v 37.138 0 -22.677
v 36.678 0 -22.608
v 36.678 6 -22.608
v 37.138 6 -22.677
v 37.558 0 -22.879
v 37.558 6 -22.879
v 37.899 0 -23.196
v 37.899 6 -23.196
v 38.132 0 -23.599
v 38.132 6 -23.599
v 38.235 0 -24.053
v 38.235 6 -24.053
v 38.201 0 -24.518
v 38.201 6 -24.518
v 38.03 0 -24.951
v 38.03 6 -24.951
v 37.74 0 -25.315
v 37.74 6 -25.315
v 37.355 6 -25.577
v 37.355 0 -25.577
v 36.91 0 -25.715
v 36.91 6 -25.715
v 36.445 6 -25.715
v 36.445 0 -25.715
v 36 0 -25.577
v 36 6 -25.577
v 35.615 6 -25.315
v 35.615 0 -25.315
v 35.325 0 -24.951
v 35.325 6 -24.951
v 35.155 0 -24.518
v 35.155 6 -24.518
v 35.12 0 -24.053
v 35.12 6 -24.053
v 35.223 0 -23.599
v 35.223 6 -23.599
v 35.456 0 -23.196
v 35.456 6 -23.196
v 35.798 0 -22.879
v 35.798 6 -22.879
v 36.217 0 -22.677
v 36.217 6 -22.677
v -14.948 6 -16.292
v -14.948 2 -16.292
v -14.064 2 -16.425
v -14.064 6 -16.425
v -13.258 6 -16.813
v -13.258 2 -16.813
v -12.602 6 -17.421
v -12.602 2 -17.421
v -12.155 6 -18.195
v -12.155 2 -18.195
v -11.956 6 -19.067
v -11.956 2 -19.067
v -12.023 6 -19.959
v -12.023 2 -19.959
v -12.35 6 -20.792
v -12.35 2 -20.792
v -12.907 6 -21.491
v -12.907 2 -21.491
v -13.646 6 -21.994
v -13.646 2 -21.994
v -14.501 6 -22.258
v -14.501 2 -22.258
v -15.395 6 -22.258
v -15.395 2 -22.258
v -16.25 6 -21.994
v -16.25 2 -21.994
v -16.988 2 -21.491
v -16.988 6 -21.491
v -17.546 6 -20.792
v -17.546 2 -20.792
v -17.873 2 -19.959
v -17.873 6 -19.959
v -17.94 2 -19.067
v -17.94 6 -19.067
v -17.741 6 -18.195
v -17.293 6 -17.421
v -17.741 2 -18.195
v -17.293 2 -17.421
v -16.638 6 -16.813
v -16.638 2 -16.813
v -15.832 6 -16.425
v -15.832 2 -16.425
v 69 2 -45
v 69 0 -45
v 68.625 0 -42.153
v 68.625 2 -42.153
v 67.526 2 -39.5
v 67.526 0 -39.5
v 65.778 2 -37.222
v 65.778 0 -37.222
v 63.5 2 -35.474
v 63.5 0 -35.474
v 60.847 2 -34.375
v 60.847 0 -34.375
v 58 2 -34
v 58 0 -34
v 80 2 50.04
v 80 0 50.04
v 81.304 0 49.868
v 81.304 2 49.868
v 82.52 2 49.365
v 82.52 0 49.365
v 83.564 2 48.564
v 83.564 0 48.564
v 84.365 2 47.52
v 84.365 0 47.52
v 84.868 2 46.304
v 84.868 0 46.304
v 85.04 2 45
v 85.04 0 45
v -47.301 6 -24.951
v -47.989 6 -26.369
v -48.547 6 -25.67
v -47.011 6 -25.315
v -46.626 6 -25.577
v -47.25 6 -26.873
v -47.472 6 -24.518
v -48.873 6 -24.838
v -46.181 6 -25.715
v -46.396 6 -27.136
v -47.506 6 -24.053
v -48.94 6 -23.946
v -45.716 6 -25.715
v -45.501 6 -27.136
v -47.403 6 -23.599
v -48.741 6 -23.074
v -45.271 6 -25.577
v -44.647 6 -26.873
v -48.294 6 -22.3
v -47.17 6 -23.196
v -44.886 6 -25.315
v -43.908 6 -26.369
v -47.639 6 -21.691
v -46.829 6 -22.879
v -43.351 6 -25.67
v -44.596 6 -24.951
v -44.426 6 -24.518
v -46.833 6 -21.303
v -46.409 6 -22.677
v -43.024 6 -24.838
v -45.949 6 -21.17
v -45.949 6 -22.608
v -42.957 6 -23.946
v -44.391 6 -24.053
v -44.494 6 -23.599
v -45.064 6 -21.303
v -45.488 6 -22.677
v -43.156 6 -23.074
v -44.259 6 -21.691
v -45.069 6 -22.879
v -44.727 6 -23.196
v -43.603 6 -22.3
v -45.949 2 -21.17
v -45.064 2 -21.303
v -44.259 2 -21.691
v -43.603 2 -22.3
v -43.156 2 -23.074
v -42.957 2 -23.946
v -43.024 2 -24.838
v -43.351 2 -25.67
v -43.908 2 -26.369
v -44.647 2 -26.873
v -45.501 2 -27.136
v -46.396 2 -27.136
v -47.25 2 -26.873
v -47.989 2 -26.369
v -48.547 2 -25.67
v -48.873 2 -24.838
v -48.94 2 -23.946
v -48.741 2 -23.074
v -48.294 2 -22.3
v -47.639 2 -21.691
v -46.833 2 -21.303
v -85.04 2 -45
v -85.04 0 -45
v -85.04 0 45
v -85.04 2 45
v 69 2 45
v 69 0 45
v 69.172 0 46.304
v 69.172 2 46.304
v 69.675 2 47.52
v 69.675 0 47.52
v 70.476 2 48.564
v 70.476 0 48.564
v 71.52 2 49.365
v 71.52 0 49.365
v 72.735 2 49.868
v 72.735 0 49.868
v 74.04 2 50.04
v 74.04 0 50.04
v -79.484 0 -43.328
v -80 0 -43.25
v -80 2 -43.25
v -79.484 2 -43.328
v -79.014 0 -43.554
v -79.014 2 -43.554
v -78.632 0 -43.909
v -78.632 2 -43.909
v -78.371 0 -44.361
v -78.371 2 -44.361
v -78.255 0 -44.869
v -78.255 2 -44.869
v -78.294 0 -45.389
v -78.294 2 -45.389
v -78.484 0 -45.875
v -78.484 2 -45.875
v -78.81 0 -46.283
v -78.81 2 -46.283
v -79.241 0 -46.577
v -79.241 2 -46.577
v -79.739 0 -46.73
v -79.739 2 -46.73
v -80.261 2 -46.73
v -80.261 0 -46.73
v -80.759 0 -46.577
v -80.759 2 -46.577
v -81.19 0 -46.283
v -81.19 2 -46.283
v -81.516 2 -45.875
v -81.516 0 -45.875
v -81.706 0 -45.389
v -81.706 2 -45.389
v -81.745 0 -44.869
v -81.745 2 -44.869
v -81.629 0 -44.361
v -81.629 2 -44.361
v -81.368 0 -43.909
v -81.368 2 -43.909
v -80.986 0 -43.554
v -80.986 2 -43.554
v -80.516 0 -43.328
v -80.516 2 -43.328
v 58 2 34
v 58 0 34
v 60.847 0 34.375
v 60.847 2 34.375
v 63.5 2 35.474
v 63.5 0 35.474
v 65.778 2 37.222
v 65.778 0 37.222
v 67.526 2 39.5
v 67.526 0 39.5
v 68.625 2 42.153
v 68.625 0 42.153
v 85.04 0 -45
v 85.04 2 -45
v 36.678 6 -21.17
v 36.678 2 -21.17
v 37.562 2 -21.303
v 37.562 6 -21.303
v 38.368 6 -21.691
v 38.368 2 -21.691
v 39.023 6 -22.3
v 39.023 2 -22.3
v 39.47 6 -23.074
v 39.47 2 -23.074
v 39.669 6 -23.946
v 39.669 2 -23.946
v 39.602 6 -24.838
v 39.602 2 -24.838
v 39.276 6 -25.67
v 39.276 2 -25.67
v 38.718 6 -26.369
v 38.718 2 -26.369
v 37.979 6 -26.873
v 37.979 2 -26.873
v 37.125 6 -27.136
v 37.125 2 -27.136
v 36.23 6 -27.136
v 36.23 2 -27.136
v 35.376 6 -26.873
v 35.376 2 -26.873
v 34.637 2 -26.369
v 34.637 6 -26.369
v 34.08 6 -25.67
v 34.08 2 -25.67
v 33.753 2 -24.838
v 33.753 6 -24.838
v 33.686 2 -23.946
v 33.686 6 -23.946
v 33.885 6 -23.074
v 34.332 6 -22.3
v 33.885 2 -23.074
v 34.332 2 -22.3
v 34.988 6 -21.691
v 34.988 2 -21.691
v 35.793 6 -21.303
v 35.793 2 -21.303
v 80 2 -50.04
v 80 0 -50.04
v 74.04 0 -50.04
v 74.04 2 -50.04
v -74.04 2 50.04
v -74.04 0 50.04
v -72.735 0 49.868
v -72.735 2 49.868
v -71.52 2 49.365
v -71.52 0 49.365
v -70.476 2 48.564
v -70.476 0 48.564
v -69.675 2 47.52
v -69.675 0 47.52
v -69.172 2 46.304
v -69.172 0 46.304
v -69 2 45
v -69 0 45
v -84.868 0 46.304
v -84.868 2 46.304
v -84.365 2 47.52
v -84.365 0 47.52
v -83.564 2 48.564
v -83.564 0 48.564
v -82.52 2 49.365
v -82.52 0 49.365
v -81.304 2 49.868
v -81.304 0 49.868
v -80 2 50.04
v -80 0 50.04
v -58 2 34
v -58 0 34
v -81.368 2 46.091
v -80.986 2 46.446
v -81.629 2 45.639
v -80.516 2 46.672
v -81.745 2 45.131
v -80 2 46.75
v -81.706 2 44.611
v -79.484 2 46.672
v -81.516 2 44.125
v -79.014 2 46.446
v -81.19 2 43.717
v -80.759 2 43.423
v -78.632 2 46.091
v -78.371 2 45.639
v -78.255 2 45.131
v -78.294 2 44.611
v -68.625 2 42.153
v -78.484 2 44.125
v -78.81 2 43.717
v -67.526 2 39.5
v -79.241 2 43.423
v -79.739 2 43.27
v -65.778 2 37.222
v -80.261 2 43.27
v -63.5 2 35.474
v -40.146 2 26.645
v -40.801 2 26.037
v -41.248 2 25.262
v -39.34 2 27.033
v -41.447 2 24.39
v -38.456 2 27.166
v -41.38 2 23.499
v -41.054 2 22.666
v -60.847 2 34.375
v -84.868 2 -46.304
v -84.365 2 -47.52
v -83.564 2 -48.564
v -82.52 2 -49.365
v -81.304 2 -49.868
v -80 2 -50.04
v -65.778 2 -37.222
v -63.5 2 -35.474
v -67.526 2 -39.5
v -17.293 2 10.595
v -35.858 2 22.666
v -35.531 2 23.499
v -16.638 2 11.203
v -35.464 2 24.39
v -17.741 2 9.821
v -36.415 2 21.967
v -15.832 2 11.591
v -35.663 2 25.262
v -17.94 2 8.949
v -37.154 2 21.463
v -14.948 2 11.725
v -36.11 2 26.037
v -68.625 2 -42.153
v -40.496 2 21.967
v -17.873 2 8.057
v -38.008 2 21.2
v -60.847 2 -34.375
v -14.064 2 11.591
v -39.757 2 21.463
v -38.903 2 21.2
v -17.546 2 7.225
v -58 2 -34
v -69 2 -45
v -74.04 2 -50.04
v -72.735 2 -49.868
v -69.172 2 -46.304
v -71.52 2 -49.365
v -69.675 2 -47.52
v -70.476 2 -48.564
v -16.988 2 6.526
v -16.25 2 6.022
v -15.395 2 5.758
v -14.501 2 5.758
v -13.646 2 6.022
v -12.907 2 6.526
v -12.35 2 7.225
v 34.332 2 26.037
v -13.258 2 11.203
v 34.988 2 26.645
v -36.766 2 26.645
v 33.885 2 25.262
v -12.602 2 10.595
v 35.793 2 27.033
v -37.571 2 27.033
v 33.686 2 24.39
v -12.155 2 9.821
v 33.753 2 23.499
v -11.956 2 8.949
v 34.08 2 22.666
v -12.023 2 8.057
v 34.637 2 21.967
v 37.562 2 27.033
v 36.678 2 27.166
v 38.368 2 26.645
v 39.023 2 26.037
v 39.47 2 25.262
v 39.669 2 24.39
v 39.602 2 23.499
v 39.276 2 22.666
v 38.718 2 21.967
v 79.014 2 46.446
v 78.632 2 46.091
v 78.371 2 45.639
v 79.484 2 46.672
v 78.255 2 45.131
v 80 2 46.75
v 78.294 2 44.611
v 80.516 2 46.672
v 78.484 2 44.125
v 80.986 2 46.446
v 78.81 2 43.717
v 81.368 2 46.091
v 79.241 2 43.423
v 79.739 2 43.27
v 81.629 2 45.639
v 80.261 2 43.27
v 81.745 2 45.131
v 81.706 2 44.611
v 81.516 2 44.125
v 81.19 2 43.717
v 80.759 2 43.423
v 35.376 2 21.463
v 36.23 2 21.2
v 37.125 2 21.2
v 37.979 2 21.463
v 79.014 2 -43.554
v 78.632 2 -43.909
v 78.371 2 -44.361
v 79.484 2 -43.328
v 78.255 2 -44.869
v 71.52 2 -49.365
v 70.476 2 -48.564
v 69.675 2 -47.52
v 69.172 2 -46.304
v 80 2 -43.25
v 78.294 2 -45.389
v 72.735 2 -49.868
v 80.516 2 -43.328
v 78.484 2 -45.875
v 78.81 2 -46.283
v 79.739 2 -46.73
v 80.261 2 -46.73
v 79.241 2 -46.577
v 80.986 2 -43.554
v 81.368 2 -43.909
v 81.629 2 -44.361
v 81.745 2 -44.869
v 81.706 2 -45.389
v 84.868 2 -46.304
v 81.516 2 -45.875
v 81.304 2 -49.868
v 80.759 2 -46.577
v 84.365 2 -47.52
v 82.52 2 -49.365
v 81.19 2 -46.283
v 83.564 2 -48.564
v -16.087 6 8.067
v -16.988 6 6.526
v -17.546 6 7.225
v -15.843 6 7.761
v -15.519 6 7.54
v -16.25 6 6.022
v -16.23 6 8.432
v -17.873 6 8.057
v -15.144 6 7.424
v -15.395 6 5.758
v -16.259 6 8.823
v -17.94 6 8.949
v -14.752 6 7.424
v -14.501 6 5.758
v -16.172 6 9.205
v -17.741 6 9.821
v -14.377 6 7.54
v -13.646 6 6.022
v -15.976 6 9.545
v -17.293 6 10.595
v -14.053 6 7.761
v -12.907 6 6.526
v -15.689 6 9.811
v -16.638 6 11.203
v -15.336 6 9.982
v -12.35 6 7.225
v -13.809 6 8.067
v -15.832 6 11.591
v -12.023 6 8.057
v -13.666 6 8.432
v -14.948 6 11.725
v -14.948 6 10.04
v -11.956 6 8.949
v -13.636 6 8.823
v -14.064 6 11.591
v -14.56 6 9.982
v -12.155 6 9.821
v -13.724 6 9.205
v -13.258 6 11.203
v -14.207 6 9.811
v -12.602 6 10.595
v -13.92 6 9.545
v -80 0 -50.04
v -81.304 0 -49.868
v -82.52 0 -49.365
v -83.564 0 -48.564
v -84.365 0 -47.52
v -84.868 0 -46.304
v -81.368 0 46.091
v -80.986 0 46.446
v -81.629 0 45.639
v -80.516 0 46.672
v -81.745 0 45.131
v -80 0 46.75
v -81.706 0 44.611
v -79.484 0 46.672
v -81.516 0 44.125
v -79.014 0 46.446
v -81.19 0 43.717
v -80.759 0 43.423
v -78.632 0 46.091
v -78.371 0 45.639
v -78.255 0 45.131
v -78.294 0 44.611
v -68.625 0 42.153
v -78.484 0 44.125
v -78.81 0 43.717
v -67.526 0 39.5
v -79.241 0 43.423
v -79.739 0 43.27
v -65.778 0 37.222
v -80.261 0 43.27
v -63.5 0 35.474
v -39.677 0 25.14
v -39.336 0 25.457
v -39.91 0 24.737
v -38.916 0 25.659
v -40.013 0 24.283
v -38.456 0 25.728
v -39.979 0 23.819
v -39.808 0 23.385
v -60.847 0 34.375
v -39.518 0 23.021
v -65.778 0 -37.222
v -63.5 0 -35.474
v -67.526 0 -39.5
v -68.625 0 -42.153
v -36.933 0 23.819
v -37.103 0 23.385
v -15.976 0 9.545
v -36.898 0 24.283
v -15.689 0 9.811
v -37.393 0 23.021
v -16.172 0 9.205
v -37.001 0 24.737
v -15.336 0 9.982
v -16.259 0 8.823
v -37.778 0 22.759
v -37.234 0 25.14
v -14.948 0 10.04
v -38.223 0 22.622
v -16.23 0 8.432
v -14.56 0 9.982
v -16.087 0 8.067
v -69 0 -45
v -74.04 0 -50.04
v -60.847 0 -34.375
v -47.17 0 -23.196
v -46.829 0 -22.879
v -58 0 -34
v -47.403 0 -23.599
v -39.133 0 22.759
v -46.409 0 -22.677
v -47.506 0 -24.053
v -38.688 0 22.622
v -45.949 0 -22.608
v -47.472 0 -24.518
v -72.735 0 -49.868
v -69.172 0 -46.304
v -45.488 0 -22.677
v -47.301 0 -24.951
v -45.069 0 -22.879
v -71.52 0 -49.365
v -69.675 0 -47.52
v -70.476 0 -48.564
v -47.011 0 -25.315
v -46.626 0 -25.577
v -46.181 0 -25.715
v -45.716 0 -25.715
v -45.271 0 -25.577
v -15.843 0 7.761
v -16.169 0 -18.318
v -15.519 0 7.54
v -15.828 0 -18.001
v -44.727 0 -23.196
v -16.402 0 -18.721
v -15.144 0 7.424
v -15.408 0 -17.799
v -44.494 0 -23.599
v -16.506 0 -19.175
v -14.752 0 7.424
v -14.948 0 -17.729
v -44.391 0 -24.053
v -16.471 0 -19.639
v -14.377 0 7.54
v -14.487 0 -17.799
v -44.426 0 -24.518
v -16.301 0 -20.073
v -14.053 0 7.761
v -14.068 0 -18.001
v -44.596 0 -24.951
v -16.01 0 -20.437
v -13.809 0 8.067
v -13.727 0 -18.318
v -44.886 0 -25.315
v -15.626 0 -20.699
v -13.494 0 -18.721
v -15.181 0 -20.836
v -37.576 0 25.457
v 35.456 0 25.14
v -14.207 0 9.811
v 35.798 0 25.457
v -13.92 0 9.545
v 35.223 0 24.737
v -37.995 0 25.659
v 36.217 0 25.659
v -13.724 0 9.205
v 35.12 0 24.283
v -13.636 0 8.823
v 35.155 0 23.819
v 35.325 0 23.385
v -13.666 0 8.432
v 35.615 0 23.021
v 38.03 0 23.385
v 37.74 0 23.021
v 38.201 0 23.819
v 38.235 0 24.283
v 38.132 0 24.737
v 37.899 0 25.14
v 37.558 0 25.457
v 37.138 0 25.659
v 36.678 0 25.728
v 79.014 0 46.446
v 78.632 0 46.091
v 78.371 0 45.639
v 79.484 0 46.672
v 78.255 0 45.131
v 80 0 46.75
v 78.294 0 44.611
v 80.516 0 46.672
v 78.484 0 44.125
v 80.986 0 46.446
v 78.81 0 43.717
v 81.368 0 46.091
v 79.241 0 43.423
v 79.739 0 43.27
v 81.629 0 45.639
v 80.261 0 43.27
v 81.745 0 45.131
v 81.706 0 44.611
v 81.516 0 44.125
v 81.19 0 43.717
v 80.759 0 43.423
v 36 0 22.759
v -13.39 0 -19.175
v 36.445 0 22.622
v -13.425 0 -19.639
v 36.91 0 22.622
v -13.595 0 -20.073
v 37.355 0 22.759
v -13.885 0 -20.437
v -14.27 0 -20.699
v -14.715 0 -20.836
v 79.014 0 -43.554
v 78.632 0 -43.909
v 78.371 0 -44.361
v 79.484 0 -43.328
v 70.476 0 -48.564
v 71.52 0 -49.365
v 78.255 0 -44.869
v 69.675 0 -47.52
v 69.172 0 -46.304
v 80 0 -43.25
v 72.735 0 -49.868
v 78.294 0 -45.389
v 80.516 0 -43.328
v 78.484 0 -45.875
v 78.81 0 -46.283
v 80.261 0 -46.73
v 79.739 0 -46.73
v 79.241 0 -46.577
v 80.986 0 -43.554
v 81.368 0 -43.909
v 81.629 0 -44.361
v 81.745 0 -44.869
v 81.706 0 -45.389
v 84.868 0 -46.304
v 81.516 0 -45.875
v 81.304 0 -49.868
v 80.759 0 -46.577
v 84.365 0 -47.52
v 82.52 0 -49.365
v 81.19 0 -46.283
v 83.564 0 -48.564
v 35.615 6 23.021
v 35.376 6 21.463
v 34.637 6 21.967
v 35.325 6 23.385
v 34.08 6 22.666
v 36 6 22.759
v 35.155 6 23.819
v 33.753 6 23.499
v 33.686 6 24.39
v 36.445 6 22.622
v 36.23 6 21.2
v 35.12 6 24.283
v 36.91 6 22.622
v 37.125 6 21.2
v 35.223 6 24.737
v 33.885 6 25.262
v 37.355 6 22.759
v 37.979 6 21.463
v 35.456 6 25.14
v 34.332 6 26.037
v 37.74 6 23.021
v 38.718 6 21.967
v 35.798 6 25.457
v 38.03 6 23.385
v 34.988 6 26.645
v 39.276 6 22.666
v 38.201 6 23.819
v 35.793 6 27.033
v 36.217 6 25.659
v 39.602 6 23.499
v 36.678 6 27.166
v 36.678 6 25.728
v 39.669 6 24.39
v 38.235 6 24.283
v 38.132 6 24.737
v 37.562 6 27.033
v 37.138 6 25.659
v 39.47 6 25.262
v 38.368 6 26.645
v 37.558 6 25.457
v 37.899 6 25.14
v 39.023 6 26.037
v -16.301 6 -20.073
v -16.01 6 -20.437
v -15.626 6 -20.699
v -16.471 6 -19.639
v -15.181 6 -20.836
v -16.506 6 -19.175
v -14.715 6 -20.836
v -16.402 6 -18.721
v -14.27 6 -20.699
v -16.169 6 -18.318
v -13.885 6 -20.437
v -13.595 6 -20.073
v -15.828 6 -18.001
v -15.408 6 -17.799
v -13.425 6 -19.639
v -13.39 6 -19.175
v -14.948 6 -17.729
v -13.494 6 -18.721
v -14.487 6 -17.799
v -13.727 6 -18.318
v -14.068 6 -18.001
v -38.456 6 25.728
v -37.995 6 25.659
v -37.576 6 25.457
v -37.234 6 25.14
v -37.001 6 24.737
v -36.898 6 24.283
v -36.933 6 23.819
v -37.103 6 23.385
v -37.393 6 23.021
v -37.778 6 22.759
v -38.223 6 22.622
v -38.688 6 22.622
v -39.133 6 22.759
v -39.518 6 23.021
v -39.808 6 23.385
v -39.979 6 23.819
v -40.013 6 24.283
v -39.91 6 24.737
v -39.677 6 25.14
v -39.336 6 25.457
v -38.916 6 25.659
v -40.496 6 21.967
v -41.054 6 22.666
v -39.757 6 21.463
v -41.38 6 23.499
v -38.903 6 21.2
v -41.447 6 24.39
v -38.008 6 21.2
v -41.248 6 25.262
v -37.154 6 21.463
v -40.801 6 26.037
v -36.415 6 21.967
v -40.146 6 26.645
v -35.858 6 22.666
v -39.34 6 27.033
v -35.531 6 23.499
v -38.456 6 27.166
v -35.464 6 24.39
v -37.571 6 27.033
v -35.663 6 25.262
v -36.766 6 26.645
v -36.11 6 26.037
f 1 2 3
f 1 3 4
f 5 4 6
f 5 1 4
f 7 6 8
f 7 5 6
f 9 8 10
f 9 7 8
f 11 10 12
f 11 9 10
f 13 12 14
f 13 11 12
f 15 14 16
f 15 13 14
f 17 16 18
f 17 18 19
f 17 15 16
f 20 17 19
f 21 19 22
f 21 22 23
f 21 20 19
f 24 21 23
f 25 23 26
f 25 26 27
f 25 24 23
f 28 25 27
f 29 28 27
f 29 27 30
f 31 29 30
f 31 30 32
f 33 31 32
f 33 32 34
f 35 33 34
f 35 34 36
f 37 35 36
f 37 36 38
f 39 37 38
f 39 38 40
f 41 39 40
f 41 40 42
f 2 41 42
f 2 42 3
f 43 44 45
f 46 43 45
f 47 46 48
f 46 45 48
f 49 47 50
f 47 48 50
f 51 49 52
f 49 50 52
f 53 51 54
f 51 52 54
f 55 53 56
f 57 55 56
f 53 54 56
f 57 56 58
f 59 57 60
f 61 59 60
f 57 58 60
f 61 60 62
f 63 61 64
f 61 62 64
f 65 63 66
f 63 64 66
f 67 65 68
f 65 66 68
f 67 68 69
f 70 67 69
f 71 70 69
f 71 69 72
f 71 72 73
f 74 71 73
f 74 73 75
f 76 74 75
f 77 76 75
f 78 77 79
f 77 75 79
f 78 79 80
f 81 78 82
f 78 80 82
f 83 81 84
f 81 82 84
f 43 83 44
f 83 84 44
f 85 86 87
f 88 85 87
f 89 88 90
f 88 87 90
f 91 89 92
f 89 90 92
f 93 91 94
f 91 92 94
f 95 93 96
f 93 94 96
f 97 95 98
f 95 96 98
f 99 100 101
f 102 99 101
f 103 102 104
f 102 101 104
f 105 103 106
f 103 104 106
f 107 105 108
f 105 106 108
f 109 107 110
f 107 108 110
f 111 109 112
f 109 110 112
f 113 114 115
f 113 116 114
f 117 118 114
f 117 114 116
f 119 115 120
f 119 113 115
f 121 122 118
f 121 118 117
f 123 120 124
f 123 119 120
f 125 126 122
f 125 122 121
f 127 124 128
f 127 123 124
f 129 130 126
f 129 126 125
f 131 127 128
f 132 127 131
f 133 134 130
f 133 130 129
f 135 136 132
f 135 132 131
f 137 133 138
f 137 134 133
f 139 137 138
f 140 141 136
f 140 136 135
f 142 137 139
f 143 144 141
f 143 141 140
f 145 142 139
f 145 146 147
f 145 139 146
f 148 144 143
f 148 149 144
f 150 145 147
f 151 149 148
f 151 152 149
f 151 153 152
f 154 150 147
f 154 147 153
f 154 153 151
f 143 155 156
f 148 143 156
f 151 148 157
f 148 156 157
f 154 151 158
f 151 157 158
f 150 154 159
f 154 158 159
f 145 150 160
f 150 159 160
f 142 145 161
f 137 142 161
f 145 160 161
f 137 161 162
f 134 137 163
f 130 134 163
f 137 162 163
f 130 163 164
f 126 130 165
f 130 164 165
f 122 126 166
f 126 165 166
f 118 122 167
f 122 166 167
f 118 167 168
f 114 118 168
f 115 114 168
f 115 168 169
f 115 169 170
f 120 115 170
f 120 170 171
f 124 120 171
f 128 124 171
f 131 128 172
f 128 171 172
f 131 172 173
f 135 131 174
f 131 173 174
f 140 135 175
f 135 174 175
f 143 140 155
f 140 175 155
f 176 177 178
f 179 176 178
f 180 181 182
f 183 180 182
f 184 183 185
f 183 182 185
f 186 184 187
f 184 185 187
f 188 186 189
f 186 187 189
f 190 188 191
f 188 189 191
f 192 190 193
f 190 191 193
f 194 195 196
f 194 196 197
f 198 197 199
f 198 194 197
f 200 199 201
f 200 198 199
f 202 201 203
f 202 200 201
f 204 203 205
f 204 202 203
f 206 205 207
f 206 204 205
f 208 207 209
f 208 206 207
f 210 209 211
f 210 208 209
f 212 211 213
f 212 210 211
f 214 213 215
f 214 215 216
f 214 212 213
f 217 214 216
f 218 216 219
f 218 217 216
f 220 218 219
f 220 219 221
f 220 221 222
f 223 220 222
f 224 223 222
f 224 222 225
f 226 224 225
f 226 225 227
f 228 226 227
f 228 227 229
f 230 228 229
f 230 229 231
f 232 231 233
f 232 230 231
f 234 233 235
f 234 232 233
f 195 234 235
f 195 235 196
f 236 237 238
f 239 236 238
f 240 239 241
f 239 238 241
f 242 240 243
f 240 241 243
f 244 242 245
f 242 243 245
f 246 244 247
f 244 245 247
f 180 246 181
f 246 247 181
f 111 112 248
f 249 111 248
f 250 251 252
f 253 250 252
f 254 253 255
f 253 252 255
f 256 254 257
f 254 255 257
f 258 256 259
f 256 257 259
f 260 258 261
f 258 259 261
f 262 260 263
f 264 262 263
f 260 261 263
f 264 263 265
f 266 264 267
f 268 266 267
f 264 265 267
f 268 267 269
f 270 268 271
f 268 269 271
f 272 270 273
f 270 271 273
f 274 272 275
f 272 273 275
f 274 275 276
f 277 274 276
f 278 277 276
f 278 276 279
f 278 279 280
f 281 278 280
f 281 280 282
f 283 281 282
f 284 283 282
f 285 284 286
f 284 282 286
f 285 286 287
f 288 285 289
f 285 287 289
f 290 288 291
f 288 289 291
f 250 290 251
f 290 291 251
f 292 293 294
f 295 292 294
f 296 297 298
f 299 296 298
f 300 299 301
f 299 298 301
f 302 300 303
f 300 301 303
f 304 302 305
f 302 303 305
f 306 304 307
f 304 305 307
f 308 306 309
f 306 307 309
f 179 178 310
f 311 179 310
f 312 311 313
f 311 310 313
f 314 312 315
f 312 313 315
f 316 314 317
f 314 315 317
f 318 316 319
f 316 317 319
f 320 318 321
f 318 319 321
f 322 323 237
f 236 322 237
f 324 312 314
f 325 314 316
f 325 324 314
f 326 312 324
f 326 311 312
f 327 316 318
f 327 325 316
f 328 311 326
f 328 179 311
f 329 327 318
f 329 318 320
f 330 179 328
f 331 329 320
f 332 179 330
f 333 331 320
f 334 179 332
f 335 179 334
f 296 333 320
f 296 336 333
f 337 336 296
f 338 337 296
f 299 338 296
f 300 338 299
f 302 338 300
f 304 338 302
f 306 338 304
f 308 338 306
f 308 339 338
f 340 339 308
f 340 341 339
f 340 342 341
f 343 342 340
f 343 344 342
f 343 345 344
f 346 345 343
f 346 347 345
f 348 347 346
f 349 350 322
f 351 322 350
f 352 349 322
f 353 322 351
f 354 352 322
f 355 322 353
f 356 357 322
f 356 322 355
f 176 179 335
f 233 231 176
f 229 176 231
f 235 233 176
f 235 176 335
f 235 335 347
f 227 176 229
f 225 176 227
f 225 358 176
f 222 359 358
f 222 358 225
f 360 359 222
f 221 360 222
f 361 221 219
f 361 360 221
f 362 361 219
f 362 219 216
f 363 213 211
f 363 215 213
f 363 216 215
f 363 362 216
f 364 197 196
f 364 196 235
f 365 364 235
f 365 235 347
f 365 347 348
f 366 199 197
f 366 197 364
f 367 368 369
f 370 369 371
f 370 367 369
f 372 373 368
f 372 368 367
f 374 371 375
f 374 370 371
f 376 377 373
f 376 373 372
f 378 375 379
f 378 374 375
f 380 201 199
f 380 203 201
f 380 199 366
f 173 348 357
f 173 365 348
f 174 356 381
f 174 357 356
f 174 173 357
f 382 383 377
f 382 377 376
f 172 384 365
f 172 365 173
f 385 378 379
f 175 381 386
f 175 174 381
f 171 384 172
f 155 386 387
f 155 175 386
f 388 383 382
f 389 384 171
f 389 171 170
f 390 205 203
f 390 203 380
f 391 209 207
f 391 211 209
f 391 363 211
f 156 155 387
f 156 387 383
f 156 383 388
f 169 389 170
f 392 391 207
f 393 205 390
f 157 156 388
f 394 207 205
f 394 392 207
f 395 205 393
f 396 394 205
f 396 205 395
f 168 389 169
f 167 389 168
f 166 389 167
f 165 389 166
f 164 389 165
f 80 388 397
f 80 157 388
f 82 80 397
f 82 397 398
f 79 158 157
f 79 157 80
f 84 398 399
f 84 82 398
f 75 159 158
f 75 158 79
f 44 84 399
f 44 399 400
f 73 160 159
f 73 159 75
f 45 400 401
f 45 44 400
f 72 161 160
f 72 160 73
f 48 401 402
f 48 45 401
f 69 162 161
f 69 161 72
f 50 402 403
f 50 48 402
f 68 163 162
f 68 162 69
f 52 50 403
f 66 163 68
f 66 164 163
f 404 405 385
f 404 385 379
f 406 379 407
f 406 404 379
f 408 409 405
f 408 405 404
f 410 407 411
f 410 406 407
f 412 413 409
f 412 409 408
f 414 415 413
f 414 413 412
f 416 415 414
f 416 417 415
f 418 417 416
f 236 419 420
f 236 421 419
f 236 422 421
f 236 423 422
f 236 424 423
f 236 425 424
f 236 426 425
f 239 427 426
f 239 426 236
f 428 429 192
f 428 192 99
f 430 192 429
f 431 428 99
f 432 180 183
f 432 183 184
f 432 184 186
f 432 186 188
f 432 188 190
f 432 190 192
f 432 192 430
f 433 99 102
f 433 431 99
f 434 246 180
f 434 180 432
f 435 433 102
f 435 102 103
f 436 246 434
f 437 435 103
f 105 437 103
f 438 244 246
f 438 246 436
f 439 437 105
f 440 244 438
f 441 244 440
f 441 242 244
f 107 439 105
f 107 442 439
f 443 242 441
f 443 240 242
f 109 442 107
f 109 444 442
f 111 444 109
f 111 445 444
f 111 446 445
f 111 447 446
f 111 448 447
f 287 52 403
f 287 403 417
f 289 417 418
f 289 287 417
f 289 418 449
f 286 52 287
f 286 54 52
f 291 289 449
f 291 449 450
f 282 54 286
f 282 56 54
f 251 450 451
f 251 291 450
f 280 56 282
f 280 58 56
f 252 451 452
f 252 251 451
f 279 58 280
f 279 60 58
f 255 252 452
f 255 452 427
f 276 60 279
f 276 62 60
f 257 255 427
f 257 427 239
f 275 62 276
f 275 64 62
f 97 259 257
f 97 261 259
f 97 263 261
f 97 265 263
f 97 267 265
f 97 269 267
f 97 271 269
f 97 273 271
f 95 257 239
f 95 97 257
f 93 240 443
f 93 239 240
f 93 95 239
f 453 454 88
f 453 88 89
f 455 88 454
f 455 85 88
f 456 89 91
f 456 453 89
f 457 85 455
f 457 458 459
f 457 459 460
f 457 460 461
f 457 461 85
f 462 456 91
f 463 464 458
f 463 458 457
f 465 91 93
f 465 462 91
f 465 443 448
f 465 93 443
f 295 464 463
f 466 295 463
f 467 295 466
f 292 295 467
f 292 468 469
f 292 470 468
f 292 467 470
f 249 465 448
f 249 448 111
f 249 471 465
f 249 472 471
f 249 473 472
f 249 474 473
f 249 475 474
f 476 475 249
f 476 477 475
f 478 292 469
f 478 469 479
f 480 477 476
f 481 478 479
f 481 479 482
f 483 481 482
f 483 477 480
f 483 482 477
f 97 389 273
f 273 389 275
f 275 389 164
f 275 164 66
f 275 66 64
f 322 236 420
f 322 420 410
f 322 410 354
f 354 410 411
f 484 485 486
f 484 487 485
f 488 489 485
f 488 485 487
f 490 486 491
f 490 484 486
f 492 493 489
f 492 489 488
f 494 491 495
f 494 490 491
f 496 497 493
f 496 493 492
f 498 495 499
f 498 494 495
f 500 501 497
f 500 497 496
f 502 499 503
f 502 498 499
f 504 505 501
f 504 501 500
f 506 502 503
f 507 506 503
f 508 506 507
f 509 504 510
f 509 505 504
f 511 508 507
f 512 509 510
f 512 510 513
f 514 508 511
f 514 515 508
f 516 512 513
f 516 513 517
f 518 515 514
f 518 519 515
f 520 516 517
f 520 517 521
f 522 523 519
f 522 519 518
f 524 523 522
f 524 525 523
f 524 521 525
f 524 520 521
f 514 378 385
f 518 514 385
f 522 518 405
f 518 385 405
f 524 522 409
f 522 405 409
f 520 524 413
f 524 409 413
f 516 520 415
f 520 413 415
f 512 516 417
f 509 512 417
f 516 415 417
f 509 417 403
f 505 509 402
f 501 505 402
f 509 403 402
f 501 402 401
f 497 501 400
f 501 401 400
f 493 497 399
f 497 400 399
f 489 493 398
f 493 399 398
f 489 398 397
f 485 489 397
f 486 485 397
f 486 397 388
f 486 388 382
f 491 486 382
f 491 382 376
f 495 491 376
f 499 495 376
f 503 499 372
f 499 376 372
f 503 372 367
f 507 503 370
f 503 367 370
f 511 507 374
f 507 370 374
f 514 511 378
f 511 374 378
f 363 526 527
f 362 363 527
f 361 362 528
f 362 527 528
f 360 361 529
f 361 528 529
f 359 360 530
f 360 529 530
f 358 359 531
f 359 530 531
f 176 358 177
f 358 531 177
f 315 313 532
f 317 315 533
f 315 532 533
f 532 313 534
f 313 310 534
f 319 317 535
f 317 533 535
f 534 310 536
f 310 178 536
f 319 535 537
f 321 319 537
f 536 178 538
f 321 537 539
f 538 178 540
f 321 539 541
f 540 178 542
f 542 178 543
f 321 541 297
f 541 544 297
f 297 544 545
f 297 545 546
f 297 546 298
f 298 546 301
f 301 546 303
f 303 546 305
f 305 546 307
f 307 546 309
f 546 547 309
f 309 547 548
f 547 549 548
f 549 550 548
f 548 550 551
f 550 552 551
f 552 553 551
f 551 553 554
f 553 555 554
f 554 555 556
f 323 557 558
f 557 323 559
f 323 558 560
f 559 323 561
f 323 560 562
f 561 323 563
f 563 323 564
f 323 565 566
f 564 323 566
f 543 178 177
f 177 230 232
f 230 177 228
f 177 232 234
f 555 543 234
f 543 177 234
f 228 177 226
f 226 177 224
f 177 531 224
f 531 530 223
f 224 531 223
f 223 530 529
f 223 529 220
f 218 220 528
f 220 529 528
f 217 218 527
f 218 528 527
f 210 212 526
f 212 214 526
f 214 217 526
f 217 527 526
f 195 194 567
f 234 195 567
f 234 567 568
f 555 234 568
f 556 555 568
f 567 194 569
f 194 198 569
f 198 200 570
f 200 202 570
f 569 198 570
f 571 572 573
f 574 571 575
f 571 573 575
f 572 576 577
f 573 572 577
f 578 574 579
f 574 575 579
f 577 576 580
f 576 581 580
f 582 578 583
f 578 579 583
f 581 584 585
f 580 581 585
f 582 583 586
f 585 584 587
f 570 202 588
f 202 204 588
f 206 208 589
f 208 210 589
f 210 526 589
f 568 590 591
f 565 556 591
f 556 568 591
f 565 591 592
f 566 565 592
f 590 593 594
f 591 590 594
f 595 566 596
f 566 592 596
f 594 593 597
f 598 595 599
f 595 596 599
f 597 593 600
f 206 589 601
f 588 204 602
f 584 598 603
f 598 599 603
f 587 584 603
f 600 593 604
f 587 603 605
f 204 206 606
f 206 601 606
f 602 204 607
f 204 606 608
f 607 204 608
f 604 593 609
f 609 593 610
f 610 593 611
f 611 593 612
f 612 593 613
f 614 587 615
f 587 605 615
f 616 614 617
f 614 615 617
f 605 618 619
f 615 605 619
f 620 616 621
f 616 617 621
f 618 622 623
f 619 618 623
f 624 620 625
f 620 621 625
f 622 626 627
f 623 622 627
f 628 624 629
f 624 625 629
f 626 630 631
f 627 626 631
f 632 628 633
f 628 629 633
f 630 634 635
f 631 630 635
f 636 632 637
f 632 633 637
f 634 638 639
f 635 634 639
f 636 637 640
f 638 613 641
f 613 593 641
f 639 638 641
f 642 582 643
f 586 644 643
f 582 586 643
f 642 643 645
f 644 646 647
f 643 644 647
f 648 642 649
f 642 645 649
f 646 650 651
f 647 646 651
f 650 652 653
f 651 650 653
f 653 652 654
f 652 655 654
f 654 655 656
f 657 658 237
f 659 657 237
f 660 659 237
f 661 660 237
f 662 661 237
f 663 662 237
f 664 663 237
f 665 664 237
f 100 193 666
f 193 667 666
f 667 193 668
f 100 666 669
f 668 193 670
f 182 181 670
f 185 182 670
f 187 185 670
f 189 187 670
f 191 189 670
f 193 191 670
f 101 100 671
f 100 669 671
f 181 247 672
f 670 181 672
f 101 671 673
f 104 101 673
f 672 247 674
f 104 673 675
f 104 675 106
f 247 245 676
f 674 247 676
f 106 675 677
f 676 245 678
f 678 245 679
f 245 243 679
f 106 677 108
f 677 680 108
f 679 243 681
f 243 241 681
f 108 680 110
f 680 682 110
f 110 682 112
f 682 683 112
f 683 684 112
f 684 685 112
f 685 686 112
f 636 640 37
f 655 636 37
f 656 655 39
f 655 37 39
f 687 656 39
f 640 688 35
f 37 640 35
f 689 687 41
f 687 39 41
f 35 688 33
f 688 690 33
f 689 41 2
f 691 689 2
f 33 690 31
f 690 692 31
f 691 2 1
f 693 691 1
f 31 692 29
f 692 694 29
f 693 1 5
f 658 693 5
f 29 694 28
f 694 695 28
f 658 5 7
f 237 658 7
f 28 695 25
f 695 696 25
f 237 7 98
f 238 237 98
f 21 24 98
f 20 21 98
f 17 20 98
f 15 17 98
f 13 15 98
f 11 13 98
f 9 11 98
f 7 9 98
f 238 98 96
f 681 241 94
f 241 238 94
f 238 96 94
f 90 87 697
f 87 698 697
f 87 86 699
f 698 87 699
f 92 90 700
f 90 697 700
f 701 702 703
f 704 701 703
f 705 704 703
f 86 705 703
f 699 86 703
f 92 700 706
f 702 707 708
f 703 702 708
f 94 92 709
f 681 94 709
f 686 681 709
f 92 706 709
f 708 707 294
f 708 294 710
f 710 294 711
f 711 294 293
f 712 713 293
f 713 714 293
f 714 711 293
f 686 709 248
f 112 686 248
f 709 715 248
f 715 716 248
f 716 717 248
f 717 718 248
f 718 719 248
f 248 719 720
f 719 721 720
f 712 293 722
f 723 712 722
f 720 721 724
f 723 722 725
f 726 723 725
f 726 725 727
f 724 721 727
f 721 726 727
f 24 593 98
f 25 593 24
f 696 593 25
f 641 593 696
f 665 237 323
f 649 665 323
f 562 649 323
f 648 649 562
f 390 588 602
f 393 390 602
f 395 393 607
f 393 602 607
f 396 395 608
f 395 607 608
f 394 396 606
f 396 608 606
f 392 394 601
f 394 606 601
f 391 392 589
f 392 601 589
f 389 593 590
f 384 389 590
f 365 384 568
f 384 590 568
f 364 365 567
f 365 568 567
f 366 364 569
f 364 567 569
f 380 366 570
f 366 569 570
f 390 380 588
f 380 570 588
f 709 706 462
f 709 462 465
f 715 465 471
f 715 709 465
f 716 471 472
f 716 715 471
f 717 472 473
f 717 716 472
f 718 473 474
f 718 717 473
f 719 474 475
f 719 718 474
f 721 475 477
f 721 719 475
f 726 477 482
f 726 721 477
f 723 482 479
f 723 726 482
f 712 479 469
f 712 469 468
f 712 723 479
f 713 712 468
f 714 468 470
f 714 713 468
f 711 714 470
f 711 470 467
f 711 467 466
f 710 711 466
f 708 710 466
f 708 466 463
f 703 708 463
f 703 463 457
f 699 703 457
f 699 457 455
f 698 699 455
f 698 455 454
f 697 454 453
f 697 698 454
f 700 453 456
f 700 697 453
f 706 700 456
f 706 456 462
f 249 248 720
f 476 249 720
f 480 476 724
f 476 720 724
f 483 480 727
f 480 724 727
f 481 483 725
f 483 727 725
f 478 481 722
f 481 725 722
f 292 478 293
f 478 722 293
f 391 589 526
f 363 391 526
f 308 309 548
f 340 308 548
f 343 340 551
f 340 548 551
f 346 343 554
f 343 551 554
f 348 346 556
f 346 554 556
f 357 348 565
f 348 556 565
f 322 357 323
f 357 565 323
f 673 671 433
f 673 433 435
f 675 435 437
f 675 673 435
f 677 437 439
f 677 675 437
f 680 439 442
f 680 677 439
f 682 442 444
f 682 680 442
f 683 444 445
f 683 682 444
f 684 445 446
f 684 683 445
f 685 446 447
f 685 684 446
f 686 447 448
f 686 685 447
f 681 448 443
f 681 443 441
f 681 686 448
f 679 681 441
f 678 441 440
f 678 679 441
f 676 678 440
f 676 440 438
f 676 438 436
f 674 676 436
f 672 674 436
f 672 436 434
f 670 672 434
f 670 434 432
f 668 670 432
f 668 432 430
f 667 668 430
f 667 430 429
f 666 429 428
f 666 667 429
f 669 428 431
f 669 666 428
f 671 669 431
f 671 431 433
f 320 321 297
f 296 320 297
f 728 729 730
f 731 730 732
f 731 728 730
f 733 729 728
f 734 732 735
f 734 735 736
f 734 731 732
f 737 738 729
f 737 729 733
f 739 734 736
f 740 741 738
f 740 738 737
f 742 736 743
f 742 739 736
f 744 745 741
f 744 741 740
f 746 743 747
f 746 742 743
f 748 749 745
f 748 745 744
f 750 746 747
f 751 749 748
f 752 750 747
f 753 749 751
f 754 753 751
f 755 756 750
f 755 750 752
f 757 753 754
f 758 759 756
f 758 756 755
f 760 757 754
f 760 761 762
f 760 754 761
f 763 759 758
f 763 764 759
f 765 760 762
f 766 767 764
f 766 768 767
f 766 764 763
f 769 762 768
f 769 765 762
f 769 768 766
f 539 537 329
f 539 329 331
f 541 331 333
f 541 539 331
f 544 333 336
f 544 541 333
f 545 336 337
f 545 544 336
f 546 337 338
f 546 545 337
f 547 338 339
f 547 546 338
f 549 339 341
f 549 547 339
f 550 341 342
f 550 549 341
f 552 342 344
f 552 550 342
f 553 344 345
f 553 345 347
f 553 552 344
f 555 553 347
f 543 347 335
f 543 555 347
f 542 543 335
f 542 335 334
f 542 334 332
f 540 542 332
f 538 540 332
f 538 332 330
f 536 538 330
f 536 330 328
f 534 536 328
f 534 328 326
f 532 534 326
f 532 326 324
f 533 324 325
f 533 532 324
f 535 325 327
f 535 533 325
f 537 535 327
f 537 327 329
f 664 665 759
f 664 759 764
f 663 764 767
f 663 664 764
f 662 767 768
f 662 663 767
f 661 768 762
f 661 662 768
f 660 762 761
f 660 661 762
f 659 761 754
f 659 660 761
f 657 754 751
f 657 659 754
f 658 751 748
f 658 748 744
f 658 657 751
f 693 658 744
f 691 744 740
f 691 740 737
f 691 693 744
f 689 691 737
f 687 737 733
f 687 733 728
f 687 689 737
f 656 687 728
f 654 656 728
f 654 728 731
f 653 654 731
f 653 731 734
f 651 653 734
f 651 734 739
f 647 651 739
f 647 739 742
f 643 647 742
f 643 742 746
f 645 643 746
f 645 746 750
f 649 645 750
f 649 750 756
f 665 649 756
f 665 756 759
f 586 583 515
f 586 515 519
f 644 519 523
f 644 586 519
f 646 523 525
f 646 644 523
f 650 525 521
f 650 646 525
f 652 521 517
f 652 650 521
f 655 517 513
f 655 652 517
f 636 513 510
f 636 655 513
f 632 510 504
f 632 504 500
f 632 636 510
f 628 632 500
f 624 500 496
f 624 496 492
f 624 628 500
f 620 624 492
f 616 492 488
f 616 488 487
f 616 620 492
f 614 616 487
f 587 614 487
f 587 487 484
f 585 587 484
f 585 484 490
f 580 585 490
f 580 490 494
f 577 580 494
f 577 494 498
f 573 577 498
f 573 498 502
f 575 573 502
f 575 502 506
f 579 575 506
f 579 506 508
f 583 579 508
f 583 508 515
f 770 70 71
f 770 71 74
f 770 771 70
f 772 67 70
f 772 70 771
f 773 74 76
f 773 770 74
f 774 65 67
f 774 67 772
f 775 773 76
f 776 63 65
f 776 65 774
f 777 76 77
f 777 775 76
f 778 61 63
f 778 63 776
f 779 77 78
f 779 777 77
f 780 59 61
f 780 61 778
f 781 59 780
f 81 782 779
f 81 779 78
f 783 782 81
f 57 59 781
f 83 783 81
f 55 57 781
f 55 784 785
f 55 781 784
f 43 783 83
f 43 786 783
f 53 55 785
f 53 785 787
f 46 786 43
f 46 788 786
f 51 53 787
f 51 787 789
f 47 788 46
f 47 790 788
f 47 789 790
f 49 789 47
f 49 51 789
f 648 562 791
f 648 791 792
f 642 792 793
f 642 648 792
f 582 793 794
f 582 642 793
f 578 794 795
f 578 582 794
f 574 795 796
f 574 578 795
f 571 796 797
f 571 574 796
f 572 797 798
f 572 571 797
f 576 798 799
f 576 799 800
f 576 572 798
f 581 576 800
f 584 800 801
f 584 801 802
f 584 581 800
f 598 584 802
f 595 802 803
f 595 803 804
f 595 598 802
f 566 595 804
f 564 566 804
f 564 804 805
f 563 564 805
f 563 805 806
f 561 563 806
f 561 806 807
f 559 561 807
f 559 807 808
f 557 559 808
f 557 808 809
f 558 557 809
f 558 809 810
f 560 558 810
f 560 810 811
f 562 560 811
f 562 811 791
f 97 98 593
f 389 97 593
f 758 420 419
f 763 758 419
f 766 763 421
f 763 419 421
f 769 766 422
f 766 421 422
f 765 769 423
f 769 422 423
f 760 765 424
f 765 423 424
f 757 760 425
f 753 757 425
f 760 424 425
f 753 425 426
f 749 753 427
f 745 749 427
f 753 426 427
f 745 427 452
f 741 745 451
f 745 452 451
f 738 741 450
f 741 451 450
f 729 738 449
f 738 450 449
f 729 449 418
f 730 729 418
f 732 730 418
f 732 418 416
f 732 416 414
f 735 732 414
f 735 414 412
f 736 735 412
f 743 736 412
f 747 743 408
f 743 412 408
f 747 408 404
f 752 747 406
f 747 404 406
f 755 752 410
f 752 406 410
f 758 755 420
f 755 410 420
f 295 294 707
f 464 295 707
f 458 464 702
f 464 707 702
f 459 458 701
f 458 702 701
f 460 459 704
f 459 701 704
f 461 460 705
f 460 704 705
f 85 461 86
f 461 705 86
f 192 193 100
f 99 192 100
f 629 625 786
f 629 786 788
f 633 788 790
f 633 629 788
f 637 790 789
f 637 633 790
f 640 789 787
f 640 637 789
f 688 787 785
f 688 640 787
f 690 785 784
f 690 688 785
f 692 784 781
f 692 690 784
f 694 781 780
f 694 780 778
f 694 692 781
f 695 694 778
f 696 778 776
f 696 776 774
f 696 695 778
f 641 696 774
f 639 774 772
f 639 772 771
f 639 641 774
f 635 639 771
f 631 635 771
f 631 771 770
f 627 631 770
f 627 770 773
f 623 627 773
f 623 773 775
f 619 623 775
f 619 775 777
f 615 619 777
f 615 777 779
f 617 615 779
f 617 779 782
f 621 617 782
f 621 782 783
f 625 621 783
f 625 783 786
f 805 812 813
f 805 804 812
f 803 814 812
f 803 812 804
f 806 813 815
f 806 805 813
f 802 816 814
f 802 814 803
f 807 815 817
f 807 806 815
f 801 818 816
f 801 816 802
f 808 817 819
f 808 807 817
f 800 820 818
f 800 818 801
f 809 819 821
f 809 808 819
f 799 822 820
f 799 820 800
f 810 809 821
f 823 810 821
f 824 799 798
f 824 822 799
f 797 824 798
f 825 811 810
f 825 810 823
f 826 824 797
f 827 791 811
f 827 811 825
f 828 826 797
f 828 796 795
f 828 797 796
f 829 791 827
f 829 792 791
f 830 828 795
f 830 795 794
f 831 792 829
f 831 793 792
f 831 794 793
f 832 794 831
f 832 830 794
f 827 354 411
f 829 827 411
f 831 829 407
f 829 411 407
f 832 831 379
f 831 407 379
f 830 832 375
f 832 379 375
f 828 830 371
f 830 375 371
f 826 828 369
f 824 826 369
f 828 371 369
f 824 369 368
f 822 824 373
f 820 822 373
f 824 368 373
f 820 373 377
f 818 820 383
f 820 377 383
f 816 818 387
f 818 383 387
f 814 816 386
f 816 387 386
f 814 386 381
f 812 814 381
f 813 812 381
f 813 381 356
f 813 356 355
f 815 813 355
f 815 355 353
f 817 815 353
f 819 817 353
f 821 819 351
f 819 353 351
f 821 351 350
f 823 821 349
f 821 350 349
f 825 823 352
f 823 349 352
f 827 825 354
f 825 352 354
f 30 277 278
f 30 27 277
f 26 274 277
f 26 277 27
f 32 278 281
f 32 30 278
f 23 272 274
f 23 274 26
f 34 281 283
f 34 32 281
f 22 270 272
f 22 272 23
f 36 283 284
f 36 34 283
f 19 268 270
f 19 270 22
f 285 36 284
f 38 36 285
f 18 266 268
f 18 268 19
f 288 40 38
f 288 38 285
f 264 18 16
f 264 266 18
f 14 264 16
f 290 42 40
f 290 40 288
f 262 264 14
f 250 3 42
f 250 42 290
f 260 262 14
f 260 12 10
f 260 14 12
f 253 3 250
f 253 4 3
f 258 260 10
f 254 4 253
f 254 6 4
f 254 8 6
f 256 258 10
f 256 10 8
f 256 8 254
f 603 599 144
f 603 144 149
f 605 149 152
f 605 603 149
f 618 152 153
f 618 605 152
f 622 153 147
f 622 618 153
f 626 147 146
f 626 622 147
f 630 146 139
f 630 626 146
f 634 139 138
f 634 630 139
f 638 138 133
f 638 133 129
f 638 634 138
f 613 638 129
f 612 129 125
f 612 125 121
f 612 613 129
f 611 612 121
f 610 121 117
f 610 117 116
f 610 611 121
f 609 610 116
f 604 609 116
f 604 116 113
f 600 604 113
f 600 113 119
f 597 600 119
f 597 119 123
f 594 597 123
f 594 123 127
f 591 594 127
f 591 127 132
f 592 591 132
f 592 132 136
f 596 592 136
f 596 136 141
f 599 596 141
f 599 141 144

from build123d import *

# Parameters (mm, degrees)
ESQUISSE1_R             = 1.75
BOSS_EXTRU_1_DEPTH      = 2
ESQUISSE2_R             = 3
ESQUISSE2_R_2           = 1.5621
ESQUISSE2_R_3           = 1.315256363
BOSS_EXTRU_2_DEPTH      = 4
ENL_V_START             = -4
ESQUISSE4_R             = 1.5621
ESQUISSE4_R_2           = 1.315256363
ENL_V_MAT_EXTRU_1_DEPTH = 4


with BuildPart() as part:
    # Esquisse1 → Boss.-Extru.1 (new body)
    with BuildSketch(Plane(origin=(0, 0, 0), x_dir=(1, 0, 0), z_dir=(0, 1, 0))):
        with BuildLine():
            Line((80, 50.039706632), (74.039706632, 50.039706632))
            ThreePointArc((74.039706632, 50.039706632), (70.476095897, 48.563610735), (69, 45))
            ThreePointArc((69, 45), (65.778174593, 37.221825407), (58, 34))
            Line((58, 34), (-58, 34))
            ThreePointArc((-58, 34), (-65.778174593, 37.221825407), (-69, 45))
            ThreePointArc((-69, 45), (-70.476095897, 48.563610735), (-74.039706632, 50.039706632))
            Line((-74.039706632, 50.039706632), (-80, 50.039706632))
            ThreePointArc((-80, 50.039706632), (-83.563610735, 48.563610735), (-85.039706632, 45))
            Line((-85.039706632, 45), (-85.039706632, -45))
            ThreePointArc((-85.039706632, -45), (-83.563610735, -48.563610735), (-80, -50.039706632))
            Line((-80, -50.039706632), (-74.039706632, -50.039706632))
            ThreePointArc((-74.039706632, -50.039706632), (-70.476095897, -48.563610735), (-69, -45))
            ThreePointArc((-69, -45), (-65.778174593, -37.221825407), (-58, -34))
            Line((-58, -34), (58, -34))
            ThreePointArc((58, -34), (65.778174593, -37.221825407), (69, -45))
            ThreePointArc((69, -45), (70.476095897, -48.563610735), (74.039706632, -50.039706632))
            Line((74.039706632, -50.039706632), (80, -50.039706632))
            ThreePointArc((80, -50.039706632), (83.563610735, -48.563610735), (85.039706632, -45))
            Line((85.039706632, -45), (85.039706632, 45))
            ThreePointArc((85.039706632, 45), (83.563610735, 48.563610735), (80, 50.039706632))
        make_face()
        with Locations(Location((-80, -45, 0), (0, 0, 270))):
            Circle(ESQUISSE1_R, mode=Mode.SUBTRACT)
        with Locations(Location((-80, 45, 0), (0, 0, 270))):
            Circle(ESQUISSE1_R, mode=Mode.SUBTRACT)
        with Locations(Location((80, -45, 0), (0, 0, 270))):
            Circle(ESQUISSE1_R, mode=Mode.SUBTRACT)
        with Locations(Location((80, 45, 0), (0, 0, 270))):
            Circle(ESQUISSE1_R, mode=Mode.SUBTRACT)
    extrude(amount=BOSS_EXTRU_1_DEPTH)

    # Esquisse2 → Boss.-Extru.2 (add)
    # profile 1 of 6: a face of its own
    with BuildSketch(Plane(origin=(0, 2, 0), x_dir=(1, 0, 0), z_dir=(0, 1, 0))):
        with Locations(Location((-14.9479, 19.291507234, 0), (0, 0, 270))):
            Circle(ESQUISSE2_R)
        with Locations(Location((-14.9479, 19.291507234, 0), (0, 0, 270))):
            Circle(ESQUISSE2_R_2, mode=Mode.SUBTRACT)
    # profile 2 of 6: a face of its own
    with BuildSketch(Plane(origin=(0, 2, 0), x_dir=(1, 0, 0), z_dir=(0, 1, 0))):
        with Locations(Location((-14.9479, -8.724692766, 0), (0, 0, 270))):
            Circle(ESQUISSE2_R)
        with Locations(Location((-14.9479, -8.724692766, 0), (0, 0, 270))):
            Circle(ESQUISSE2_R_3, mode=Mode.SUBTRACT)
    # profile 3 of 6: a face of its own
    with BuildSketch(Plane(origin=(0, 2, 0), x_dir=(1, 0, 0), z_dir=(0, 1, 0))):
        with Locations(Location((-38.4556, -24.1662, 0), (0, 0, 270))):
            Circle(ESQUISSE2_R)
        with Locations(Location((-38.4556, -24.1662, 0), (0, 0, 270))):
            Circle(ESQUISSE2_R_2, mode=Mode.SUBTRACT)
    # profile 4 of 6: a face of its own
    with BuildSketch(Plane(origin=(0, 2, 0), x_dir=(1, 0, 0), z_dir=(0, 1, 0))):
        with Locations(Location((36.6776, -24.1662, 0), (0, 0, 270))):
            Circle(ESQUISSE2_R)
        with Locations(Location((36.6776, -24.1662, 0), (0, 0, 270))):
            Circle(ESQUISSE2_R_2, mode=Mode.SUBTRACT)
    # profile 5 of 6: a face of its own
    with BuildSketch(Plane(origin=(0, 2, 0), x_dir=(1, 0, 0), z_dir=(0, 1, 0))):
        with Locations(Location((36.6776, 24.17, 0), (0, 0, 270))):
            Circle(ESQUISSE2_R)
        with Locations(Location((36.6776, 24.17, 0), (0, 0, 270))):
            Circle(ESQUISSE2_R_2, mode=Mode.SUBTRACT)
    # profile 6 of 6: a face of its own
    with BuildSketch(Plane(origin=(0, 2, 0), x_dir=(1, 0, 0), z_dir=(0, 1, 0))):
        with Locations(Location((-45.9486, 24.17, 0), (0, 0, 270))):
            Circle(ESQUISSE2_R)
        with Locations(Location((-45.9486, 24.17, 0), (0, 0, 270))):
            Circle(ESQUISSE2_R_2, mode=Mode.SUBTRACT)
    extrude(amount=BOSS_EXTRU_2_DEPTH)

    # Esquisse4 → Enlèv. mat.-Extru.1 (cut)
    with BuildSketch(Plane(origin=(0, 2, 0), x_dir=(1, 0, 0), z_dir=(0, 1, 0)).offset(ENL_V_START)):
        with Locations(Location((-45.9486, 24.17, 0), (0, 0, 270))):
            Circle(ESQUISSE4_R)
        with Locations(Location((-14.9479, 19.291507234, 0), (0, 0, 270))):
            Circle(ESQUISSE4_R)
        with Locations(Location((36.6776, 24.17, 0), (0, 0, 270))):
            Circle(ESQUISSE4_R)
        with Locations(Location((36.6776, -24.1662, 0), (0, 0, 270))):
            Circle(ESQUISSE4_R)
        with Locations(Location((-14.9479, -8.724692766, 0), (0, 0, 270))):
            Circle(ESQUISSE4_R_2)
        with Locations(Location((-38.4556, -24.1662, 0), (0, 0, 270))):
            Circle(ESQUISSE4_R)
    extrude(amount=ENL_V_MAT_EXTRU_1_DEPTH, mode=Mode.SUBTRACT)


solid = part.part
